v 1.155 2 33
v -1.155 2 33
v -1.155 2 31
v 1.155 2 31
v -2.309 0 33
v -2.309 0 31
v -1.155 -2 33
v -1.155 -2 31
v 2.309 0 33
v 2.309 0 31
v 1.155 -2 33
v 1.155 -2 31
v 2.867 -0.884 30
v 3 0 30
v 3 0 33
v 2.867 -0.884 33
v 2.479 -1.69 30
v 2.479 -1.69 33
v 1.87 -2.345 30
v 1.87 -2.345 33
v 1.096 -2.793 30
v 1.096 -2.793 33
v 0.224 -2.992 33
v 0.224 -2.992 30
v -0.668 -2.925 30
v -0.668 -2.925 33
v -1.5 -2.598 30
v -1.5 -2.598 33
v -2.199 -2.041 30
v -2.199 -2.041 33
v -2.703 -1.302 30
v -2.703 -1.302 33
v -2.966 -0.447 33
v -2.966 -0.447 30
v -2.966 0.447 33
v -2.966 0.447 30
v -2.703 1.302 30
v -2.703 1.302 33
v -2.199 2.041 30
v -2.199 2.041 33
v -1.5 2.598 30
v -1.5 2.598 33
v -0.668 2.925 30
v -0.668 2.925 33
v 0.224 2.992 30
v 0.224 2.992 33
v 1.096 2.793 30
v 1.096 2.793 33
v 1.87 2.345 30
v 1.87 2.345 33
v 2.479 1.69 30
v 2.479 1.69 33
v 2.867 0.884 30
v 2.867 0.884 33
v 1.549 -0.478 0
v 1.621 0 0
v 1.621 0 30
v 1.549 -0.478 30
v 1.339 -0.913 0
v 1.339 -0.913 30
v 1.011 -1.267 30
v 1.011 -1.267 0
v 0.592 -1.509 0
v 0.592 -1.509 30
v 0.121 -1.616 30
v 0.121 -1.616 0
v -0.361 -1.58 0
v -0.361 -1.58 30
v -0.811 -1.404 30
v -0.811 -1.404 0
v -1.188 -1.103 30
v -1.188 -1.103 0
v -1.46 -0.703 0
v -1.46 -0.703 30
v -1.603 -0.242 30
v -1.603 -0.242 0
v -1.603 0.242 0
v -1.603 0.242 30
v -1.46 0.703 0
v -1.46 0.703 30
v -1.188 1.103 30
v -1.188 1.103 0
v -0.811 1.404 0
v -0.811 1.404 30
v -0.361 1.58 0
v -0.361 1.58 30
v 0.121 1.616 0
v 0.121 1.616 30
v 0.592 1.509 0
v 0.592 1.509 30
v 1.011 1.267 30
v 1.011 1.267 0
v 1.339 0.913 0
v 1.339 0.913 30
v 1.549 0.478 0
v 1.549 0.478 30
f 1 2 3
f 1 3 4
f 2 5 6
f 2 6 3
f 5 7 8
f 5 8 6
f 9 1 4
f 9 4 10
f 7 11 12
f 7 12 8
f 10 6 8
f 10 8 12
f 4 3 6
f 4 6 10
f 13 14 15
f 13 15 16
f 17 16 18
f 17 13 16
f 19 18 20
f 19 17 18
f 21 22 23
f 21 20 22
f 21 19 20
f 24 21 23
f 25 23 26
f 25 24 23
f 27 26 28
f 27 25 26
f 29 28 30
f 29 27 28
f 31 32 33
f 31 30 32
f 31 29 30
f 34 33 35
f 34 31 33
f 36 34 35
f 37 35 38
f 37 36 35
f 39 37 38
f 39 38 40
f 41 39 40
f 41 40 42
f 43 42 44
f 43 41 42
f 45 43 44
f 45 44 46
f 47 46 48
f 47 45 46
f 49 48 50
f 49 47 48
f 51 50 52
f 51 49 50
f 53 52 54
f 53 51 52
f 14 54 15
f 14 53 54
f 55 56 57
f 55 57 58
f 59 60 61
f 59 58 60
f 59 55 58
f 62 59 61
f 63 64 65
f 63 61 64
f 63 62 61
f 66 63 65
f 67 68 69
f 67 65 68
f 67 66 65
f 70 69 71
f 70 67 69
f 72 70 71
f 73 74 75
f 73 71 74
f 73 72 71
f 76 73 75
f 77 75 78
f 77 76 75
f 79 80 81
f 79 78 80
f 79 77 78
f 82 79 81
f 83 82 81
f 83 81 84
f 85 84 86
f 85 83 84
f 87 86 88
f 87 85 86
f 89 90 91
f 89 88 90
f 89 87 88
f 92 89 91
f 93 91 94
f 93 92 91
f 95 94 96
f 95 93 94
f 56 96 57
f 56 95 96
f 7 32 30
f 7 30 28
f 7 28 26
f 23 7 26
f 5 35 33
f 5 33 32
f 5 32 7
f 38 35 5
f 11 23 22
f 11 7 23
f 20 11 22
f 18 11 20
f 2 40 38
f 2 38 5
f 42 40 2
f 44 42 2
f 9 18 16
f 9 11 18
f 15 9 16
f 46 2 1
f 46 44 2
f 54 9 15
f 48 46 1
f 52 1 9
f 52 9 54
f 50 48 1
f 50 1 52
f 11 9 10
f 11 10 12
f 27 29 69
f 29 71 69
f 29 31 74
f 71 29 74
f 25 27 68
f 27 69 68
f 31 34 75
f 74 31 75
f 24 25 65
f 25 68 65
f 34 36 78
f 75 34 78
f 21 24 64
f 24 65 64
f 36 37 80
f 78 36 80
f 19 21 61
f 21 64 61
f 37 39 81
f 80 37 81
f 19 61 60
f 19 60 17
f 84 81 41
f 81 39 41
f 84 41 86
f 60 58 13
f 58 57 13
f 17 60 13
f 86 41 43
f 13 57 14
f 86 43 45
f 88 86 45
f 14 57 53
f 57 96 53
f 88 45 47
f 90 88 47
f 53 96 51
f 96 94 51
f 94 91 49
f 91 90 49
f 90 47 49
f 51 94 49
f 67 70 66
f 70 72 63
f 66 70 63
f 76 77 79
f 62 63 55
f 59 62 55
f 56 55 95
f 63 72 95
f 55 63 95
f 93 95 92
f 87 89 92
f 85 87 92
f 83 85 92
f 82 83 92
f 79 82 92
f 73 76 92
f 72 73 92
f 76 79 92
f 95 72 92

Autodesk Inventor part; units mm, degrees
ref_plane "YZ Plane" through (0, 0, 0) normal (1, 0, 0) x (0, 1, 0)
ref_plane "XZ Plane" through (0, 0, 0) normal (0, 1, 0) x (-1, 0, 0)
ref_plane "XY Plane" through (0, 0, 0) normal (0, 0, 1) x (1, 0, 0)
sketch "Sketch1" plane through (0, 0, 0) normal (0, 0, 1) x (1, 0, 0)
  circle A0 centre (0, 0) radius 1.621
  dimension "d0" = 3.242
extrude "Extrusion1" add sketch "Sketch1" along normal blind 30
sketch "Sketch2" plane through (0, 0, 30) normal (0, 0, 1) x (1, 0, 0)
  circle A0 centre (0, 0) radius 3
  dimension "d3" = 6
extrude "Extrusion2" add sketch "Sketch2" along normal blind 3
sketch "Sketch3" plane through (0, 0, 33) normal (0, 0, 1) x (1, 0, 0)
  line L0 (1.1547, 2) -> (2.3094, 0)
  line L1 (2.3094, 0) -> (1.1547, -2)
  line L2 (1.1547, -2) -> (-1.1547, -2)
  line L3 (-1.1547, -2) -> (-2.3094, 0)
  line L4 (-2.3094, 0) -> (-1.1547, 2)
  line L5 (-1.1547, 2) -> (1.1547, 2)
  point P0 (0, 0)
  point P1 (0, 0)
  point P2 (0, 2)
  dimension "d7" = 4
  dimension "d9" = 3.4641
extrude "Extrusion3" cut sketch "Sketch3" against normal blind 2
thread "Thread4" size "M4x0.7" class "6g" standard "ANSI Metric M Profile" full length
properties part number "M4 union"
